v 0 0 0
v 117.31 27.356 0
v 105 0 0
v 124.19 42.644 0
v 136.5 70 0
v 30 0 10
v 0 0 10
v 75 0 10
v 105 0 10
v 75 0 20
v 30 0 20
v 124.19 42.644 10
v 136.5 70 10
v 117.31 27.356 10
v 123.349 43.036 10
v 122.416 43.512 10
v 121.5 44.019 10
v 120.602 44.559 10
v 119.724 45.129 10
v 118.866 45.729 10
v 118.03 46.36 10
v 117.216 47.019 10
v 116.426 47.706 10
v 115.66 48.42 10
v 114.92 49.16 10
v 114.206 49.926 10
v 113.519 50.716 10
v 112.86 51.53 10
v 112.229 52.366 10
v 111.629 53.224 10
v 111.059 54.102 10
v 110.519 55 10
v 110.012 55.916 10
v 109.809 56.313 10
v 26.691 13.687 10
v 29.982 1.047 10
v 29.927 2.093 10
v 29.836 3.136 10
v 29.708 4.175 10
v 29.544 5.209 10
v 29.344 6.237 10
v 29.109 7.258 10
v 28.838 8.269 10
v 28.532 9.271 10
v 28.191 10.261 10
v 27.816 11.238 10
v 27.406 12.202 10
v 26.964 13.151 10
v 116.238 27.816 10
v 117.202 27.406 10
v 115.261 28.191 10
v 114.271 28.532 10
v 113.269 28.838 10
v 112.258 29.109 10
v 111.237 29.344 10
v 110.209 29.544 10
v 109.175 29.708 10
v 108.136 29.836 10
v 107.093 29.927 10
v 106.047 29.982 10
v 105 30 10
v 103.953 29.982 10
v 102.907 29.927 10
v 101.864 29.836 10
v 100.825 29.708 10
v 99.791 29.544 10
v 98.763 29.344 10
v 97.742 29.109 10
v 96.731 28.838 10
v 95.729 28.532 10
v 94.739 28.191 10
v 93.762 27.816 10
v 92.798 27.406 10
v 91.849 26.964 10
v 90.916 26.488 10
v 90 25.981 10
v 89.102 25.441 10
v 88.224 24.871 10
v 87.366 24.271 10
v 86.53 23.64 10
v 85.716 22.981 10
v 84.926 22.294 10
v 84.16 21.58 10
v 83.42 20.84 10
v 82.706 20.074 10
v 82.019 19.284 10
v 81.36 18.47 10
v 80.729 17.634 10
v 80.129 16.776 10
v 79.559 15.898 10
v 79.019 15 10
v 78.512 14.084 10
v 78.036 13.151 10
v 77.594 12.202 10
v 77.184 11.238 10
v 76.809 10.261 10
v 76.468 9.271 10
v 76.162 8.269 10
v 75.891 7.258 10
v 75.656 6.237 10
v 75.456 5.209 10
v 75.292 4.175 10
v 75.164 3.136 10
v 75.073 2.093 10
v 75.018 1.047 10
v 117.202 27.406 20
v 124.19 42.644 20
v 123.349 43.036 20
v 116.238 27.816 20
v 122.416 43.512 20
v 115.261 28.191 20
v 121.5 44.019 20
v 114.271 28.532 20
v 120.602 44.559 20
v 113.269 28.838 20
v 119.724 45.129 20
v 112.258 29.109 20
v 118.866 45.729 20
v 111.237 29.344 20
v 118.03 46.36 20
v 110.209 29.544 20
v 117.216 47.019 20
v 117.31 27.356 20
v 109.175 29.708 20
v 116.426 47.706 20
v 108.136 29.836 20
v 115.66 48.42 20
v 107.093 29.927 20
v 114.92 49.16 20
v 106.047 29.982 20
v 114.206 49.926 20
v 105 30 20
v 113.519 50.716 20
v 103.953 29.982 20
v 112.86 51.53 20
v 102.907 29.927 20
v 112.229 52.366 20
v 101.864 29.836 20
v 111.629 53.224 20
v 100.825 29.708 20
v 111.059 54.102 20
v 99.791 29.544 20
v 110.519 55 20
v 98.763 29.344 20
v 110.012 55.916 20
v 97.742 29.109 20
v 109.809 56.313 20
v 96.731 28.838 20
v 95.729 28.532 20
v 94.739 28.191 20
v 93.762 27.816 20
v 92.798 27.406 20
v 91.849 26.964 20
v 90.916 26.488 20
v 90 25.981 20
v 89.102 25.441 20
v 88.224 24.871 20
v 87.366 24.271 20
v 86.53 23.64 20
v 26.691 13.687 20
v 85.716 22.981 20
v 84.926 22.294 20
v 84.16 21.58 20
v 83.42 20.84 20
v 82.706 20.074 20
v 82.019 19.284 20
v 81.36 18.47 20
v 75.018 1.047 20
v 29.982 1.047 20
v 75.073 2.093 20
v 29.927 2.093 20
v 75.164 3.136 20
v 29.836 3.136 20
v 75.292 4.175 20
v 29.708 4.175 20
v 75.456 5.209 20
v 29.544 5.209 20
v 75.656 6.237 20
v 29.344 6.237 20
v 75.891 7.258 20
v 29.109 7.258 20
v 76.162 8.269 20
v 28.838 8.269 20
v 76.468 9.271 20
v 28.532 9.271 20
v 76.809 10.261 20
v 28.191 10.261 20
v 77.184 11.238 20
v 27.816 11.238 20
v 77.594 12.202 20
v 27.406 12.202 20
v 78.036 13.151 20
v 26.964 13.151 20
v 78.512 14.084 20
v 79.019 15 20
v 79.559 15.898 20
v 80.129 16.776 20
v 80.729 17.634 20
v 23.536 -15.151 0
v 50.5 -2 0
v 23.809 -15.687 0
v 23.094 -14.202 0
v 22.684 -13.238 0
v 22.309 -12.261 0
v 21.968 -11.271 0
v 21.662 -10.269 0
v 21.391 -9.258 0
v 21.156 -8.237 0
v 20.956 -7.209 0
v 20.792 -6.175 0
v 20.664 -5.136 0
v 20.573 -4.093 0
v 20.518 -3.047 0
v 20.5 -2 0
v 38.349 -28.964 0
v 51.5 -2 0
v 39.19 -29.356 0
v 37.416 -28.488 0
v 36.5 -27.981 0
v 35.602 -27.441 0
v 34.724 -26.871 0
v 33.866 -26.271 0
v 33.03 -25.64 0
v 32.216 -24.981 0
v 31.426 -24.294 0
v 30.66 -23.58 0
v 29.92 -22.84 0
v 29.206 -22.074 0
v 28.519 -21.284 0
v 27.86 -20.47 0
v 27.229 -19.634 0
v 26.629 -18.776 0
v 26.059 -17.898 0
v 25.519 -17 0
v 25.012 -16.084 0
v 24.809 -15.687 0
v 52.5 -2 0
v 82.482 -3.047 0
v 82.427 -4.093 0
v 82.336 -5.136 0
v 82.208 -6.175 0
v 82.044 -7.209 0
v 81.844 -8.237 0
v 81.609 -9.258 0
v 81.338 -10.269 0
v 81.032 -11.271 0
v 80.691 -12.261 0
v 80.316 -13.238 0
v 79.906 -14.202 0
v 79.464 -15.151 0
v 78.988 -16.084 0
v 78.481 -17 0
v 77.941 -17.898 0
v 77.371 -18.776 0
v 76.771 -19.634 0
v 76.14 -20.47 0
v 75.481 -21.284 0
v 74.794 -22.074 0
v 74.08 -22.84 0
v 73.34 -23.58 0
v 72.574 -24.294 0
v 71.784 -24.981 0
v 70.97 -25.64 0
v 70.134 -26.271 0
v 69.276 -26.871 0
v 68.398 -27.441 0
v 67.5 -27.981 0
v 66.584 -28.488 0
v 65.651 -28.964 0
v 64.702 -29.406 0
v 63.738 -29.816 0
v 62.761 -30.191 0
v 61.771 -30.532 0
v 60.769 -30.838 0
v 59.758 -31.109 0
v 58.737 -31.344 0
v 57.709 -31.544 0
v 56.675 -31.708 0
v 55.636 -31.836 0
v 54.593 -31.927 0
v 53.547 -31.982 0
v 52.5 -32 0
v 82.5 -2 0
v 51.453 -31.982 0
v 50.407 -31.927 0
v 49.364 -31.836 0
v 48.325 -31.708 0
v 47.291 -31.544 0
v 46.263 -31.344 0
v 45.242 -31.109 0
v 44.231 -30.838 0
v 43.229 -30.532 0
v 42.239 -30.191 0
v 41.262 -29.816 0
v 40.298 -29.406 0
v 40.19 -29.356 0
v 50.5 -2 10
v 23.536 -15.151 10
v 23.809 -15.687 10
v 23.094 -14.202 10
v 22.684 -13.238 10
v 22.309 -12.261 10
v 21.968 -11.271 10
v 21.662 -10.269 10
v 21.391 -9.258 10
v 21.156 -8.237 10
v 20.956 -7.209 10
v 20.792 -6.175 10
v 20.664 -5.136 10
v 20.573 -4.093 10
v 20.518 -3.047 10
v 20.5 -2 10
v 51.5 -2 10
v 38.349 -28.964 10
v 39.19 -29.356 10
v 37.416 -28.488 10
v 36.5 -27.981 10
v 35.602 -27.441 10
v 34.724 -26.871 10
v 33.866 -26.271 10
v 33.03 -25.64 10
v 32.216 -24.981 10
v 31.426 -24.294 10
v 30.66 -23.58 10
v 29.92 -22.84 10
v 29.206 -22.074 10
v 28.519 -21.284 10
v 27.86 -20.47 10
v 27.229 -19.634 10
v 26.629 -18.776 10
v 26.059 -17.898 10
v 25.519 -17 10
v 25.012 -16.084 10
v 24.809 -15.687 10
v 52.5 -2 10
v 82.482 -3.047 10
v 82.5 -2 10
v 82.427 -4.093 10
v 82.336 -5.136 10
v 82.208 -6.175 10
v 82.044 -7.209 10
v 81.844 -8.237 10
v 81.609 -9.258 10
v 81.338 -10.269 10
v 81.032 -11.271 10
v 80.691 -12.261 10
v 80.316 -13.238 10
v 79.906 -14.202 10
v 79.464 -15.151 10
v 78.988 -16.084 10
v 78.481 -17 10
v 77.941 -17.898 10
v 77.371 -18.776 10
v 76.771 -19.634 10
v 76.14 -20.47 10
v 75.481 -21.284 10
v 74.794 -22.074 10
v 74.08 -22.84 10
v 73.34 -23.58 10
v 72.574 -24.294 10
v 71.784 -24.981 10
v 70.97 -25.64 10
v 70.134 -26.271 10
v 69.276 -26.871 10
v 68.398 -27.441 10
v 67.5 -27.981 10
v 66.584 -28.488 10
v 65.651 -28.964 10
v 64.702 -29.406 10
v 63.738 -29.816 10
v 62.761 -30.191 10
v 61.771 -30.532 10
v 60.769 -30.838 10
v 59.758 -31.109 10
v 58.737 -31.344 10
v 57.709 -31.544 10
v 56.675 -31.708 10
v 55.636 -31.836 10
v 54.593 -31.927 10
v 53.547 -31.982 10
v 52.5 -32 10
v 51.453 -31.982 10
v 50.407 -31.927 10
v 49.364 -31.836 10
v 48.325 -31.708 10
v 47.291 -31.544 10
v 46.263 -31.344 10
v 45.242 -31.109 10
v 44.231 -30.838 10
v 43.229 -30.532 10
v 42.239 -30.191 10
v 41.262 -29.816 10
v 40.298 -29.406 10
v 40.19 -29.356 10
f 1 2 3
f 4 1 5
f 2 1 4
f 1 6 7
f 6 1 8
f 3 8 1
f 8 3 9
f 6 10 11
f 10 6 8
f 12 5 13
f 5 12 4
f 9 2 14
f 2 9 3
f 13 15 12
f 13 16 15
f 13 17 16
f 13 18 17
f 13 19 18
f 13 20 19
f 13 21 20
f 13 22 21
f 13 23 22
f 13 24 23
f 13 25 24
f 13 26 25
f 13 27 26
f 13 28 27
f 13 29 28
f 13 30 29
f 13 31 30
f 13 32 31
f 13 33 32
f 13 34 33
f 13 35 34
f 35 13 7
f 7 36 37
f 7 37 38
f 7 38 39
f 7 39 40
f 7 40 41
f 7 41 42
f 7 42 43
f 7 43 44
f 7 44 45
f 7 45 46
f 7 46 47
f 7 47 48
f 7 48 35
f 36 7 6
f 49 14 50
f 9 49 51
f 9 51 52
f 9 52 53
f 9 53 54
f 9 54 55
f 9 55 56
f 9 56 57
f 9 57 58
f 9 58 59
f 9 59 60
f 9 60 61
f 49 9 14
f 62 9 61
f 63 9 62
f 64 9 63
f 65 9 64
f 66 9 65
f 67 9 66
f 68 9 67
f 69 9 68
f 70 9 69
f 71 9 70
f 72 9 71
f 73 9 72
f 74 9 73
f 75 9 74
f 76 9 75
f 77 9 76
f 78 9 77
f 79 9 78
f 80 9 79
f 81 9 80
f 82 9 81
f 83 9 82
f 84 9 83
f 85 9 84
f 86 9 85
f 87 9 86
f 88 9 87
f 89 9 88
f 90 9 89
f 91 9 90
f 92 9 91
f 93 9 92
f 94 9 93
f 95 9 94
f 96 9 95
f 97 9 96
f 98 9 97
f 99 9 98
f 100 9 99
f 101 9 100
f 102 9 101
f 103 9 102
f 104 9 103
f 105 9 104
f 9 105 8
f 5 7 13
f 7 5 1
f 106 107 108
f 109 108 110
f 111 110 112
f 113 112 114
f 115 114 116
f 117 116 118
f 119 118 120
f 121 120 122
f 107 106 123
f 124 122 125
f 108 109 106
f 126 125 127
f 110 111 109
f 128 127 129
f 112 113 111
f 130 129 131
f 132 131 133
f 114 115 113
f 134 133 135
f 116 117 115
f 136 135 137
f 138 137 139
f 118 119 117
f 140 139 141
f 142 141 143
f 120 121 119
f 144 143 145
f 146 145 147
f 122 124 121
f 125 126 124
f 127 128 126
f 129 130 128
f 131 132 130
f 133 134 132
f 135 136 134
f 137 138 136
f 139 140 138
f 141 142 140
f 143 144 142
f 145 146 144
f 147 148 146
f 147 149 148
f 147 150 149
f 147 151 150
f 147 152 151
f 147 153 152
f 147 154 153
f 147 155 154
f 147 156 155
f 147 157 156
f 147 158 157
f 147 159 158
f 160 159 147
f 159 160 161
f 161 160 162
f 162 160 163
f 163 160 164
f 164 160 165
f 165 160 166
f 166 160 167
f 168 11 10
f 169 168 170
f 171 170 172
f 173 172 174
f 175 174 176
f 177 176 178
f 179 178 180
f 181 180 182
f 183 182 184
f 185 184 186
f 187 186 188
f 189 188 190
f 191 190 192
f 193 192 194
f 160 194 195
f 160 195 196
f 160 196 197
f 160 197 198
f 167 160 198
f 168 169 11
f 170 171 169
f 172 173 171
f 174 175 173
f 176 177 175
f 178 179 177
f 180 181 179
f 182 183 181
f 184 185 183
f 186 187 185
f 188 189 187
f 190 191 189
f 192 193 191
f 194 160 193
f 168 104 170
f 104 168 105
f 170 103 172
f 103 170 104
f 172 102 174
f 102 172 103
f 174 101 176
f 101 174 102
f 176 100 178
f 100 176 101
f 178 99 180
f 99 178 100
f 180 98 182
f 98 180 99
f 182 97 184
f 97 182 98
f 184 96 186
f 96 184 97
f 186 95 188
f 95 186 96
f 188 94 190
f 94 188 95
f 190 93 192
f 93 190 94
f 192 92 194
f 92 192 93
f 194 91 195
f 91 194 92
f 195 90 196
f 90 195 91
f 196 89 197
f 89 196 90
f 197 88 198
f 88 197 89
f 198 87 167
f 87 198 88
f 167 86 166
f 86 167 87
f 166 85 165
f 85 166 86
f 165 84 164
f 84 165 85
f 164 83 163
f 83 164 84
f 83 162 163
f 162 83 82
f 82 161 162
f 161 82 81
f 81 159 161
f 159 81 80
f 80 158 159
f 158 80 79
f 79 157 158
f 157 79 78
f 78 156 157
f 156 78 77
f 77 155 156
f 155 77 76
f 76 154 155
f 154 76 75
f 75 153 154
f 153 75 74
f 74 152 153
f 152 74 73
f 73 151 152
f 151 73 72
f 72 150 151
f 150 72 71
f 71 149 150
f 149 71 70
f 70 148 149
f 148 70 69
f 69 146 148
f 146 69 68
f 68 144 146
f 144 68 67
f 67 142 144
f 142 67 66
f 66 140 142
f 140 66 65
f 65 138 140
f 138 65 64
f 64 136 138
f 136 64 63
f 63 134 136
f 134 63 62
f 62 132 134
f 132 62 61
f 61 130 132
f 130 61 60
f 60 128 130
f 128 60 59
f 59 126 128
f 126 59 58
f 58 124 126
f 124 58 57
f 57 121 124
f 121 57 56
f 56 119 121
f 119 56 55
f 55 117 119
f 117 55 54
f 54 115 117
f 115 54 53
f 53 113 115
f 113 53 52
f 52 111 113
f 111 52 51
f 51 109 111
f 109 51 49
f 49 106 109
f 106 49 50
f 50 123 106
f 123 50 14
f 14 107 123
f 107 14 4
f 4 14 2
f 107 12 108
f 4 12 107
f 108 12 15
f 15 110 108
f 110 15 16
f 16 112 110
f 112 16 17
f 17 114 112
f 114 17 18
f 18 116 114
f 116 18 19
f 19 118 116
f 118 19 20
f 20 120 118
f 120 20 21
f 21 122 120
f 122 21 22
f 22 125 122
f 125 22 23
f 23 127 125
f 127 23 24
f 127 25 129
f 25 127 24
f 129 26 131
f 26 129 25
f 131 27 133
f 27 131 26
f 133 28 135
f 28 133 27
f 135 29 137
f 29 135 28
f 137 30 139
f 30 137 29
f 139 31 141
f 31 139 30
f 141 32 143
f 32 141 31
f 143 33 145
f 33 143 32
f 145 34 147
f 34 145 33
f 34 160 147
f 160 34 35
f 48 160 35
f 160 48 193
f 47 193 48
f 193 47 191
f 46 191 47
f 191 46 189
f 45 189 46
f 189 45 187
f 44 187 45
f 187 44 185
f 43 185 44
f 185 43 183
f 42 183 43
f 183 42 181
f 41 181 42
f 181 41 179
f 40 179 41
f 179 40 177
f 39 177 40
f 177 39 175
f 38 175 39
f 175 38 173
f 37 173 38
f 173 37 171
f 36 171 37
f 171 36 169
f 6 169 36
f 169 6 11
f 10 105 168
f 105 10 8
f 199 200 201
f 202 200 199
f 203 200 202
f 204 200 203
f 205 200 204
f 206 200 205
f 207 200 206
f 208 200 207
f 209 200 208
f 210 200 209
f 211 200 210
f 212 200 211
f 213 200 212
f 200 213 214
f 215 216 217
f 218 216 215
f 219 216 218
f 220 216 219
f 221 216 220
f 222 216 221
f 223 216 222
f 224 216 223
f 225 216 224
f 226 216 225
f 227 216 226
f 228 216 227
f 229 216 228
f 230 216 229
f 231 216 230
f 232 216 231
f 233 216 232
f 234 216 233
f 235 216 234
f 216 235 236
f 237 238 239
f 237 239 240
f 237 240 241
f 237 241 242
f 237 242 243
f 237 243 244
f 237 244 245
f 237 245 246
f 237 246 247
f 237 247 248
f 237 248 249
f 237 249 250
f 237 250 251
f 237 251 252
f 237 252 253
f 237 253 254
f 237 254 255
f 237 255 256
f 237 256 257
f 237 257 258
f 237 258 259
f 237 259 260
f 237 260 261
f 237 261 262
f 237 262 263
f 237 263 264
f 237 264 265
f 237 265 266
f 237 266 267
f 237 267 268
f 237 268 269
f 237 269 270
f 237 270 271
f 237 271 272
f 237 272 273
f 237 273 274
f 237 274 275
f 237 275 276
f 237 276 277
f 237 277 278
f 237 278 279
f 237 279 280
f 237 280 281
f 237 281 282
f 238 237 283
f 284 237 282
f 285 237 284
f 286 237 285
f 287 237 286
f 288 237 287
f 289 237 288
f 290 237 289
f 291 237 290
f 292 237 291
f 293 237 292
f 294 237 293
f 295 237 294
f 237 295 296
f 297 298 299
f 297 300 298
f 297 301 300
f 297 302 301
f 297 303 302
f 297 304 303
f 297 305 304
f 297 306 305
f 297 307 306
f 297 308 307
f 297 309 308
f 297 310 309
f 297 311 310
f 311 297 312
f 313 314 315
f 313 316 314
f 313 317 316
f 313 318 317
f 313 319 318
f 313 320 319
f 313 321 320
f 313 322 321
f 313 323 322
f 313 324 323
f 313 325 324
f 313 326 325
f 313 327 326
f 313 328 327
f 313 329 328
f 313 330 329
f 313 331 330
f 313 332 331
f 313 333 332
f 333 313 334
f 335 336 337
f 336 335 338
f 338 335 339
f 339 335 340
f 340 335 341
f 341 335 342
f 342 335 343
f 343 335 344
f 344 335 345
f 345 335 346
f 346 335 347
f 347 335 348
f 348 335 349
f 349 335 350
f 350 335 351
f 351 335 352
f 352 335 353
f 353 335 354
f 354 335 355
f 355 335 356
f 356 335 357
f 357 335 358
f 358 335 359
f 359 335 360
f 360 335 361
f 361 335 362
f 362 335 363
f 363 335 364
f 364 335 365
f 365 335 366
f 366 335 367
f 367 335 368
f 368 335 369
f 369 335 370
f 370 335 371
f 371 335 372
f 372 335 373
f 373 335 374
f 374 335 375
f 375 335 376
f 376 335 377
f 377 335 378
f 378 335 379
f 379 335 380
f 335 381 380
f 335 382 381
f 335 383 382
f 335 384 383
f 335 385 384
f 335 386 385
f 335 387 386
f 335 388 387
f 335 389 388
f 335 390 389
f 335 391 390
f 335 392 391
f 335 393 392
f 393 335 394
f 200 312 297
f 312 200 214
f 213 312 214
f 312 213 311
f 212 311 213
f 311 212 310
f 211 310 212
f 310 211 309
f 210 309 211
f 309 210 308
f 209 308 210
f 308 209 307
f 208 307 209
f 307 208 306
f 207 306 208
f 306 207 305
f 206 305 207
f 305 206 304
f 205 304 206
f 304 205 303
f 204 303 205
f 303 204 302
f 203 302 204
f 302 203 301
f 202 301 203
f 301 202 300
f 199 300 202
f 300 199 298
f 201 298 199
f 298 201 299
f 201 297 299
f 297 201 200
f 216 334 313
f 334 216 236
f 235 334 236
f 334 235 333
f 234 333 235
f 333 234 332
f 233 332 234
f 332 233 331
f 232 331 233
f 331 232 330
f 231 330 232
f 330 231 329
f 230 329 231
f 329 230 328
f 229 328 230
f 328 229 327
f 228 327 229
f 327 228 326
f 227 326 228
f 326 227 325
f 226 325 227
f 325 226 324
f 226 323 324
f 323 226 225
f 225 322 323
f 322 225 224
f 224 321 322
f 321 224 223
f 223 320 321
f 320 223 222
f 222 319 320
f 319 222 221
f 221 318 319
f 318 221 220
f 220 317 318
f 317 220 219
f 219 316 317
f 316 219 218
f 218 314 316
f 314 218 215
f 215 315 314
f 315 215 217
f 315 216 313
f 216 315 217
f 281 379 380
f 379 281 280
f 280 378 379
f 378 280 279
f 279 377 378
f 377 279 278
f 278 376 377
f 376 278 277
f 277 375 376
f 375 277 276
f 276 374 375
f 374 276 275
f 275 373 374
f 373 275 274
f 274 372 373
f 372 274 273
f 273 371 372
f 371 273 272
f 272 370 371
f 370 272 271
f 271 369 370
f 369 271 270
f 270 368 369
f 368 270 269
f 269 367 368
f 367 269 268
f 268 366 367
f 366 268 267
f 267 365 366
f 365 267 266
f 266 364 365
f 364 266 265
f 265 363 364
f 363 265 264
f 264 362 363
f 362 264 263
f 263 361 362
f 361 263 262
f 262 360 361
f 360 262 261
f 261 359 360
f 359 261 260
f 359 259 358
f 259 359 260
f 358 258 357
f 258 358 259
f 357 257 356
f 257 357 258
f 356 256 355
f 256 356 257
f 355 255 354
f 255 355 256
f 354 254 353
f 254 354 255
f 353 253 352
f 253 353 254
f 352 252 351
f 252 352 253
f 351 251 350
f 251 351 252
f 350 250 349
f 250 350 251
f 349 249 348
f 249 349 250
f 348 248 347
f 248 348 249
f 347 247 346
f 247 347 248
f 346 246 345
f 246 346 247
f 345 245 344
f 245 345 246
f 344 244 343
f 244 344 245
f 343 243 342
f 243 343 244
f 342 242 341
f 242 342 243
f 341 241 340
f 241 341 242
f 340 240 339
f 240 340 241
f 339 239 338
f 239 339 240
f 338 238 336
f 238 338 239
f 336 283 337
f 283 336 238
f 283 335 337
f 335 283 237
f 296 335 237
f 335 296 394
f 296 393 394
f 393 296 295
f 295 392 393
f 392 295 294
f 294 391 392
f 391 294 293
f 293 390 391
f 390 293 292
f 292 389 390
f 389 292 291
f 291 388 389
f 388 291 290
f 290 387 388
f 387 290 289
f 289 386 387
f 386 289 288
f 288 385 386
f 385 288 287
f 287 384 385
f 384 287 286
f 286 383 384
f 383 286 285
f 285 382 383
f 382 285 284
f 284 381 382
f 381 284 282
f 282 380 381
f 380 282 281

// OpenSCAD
// file Triangle Angles.scad
// Demonstrates that the angles of a triangle sum to 180 degrees
// (c) 2020 Rich Cameron, CC-BY
// measurements in mm

base = 105;
height = 70;
thickness = 20;

top = base * 1.3;

r = 30;

$fs = .1;
$fa = 2;

corners = [[0, 0], [top, height], [base, 0]];// - [for(i = [0:2]) [top / 2, height / 2]];

linear_extrude(thickness / 2) polygon(corners);
	
linear_extrude(thickness) {
	difference() {
		polygon(corners);
		for(c = corners) translate(c) circle(r);
	}
	*for(i = [0:2]) translate([i - 1, (i - 1) ? -1 : 1, 0]) intersection() {
		polygon(corners);
		translate(corners[i]) circle(r);
	}
}

linear_extrude(thickness / 2) for(i = [0:2]) translate([base / 2 + i - 2, -2, 0]) rotate(180) intersection() {
	rotate(180 * i) translate(-corners[i]) polygon(corners);
	circle(r);

}
